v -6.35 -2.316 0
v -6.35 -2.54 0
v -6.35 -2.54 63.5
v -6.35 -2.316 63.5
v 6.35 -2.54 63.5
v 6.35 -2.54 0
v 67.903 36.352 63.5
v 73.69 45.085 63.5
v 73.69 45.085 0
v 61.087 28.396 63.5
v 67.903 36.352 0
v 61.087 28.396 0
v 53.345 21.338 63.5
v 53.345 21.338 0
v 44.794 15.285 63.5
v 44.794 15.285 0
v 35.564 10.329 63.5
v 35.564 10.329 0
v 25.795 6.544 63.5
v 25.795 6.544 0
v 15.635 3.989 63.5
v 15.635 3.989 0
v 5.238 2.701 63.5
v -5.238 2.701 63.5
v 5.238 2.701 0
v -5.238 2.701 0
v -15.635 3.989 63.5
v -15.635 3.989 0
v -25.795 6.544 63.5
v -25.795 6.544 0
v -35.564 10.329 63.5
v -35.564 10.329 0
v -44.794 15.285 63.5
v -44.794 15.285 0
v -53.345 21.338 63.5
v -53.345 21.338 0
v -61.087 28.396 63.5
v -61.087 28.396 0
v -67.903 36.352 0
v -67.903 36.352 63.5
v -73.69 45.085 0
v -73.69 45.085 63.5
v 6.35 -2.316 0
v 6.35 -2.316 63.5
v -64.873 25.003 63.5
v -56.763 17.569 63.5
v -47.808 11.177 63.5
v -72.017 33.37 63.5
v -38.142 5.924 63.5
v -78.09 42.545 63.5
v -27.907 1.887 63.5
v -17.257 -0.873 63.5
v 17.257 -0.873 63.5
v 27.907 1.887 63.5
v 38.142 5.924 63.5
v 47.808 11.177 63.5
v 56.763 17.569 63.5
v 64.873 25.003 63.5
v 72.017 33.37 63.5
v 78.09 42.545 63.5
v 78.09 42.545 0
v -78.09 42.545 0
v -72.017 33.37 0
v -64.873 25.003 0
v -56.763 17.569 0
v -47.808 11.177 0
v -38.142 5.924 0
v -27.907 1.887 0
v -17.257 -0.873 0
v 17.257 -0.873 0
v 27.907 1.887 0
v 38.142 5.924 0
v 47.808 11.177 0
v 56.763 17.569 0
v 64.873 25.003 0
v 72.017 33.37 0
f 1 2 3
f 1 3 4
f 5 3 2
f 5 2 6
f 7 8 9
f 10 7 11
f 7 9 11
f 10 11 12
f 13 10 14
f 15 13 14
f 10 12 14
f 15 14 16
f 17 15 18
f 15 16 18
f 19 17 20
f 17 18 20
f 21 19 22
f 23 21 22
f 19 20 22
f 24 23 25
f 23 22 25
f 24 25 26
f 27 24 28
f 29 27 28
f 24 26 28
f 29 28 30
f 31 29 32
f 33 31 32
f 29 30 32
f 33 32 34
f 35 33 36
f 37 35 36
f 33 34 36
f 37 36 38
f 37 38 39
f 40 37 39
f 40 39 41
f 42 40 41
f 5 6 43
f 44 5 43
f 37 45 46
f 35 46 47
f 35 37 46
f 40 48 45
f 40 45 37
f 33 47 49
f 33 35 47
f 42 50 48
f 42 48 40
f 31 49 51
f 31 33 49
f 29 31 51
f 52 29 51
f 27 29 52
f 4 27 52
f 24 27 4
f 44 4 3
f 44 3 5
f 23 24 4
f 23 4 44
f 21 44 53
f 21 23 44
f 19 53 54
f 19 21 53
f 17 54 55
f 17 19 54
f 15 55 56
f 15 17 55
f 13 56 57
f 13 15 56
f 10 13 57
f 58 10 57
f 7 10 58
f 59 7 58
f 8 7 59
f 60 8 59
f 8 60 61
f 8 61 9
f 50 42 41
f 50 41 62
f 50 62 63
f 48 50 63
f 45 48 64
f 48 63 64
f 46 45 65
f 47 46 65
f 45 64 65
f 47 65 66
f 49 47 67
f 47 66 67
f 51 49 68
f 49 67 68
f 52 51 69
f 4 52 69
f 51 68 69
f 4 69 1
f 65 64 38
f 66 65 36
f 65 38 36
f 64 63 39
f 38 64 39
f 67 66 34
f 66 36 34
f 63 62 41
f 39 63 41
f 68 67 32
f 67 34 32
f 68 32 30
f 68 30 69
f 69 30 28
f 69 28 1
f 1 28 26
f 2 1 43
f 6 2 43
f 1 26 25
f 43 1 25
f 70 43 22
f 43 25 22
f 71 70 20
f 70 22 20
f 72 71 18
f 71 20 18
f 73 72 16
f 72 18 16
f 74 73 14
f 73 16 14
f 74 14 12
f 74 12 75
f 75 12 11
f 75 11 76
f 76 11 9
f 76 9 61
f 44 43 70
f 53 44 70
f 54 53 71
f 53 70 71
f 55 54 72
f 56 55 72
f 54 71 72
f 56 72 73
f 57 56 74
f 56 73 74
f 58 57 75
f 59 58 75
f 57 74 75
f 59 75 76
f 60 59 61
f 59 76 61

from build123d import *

# Parameters (mm, degrees)
SKETCH1_W           = 12.7
SKETCH1_H           = 5.08
BOSS_EXTRUDE1_DEPTH = 63.5


with BuildPart() as part:
    # Sketch1 → Boss-Extrude1 (new body)
    with BuildSketch(Plane.XY):
        Rectangle(SKETCH1_W, SKETCH1_H)
        with BuildLine():
            Line((-73.690101608, 45.085), (-78.089510659, 42.545))
            ThreePointArc((-78.089510659, 42.545), (0, -2.54), (78.089510659, 42.545))
            Line((78.089510659, 42.545), (73.690101608, 45.085))
            ThreePointArc((73.690101608, 45.085), (0, 2.54), (-73.690101608, 45.085))
        make_face()
    extrude(amount=BOSS_EXTRUDE1_DEPTH)


solid = part.part
